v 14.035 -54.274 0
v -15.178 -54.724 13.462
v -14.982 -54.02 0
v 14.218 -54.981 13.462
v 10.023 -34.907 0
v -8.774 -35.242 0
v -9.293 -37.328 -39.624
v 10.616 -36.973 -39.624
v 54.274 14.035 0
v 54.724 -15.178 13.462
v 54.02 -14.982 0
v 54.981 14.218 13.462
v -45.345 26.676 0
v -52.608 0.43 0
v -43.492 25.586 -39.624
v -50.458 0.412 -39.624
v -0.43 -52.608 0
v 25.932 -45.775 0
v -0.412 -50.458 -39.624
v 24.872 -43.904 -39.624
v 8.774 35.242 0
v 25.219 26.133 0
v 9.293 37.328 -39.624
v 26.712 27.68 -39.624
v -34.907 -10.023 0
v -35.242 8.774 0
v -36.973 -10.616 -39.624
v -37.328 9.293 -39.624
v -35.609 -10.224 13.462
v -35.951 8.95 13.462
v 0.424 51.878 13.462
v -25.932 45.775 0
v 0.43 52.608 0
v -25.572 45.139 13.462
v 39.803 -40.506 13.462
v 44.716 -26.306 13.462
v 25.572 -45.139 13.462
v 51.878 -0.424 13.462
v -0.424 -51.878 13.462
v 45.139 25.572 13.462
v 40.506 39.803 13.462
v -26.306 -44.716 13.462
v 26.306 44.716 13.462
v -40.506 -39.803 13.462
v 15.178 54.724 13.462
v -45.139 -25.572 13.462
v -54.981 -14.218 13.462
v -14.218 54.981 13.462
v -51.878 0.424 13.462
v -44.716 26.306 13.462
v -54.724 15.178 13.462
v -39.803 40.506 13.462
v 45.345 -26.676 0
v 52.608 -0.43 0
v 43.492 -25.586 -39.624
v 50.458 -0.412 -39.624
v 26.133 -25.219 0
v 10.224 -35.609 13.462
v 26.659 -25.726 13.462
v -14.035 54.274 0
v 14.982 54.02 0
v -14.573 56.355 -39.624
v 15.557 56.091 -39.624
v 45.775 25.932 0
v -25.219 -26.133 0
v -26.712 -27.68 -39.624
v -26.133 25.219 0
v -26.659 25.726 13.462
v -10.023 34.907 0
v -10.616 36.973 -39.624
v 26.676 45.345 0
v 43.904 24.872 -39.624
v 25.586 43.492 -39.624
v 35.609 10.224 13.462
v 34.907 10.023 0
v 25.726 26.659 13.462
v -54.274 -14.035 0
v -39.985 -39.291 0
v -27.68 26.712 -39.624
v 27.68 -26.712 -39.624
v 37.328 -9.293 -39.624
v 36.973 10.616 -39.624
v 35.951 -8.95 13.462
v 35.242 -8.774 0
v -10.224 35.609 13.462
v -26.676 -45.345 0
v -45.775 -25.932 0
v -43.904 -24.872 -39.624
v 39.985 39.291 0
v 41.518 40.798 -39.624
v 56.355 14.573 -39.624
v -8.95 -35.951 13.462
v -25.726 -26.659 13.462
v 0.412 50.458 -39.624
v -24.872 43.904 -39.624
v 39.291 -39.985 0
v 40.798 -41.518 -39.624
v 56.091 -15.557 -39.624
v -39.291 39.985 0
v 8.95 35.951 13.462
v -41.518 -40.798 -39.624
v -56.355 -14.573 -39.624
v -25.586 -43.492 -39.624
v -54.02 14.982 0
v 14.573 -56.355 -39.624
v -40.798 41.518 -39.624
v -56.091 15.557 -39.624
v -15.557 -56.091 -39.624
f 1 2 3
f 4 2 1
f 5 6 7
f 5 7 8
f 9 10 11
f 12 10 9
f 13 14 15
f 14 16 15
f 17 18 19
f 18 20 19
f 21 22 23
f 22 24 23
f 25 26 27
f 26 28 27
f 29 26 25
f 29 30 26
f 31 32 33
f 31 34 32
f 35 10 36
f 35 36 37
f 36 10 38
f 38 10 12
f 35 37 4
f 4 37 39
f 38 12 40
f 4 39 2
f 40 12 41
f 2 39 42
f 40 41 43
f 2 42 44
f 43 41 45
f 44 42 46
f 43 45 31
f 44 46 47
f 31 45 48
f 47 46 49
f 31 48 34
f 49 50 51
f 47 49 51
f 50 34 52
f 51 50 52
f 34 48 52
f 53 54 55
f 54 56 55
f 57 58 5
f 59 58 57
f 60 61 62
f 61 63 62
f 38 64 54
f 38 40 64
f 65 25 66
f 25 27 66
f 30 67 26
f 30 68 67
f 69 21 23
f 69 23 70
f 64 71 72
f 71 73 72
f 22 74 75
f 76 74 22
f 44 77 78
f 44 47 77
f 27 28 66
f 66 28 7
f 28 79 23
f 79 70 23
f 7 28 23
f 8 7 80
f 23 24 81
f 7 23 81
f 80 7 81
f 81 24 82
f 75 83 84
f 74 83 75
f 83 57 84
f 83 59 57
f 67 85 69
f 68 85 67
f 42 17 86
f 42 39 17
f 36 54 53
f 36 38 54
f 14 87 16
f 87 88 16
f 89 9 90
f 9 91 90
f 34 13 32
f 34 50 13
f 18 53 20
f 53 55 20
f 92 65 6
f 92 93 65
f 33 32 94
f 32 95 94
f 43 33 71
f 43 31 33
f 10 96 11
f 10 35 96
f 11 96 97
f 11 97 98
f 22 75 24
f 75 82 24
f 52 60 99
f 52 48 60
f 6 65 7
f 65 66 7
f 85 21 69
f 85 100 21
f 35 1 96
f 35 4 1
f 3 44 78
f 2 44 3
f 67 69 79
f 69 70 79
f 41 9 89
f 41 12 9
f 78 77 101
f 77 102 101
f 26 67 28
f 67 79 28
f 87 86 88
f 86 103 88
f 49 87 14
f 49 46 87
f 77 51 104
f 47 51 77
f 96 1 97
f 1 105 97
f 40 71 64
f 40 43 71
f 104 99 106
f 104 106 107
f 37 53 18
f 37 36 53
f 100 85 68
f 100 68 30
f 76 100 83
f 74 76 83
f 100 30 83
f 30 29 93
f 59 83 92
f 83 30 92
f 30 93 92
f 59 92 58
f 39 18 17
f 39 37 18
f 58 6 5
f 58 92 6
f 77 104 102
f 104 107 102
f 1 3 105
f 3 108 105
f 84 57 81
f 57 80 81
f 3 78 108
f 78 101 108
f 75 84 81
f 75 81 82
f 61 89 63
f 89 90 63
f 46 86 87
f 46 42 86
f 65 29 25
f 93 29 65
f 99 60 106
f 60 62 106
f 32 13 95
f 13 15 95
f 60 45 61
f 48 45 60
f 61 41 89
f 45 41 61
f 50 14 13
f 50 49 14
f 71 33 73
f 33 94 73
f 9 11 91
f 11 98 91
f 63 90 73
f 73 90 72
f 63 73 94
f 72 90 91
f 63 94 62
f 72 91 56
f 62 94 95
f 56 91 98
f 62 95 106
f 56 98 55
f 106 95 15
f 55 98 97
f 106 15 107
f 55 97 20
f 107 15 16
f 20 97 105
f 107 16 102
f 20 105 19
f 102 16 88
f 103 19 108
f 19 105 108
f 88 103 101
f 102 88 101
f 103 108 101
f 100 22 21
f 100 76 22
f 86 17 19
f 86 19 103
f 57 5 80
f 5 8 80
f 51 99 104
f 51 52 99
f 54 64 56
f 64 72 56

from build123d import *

# Parameters (mm, degrees)
F1_DEPTH      = 13.462
F1_TAPER      = -3
F1_DEPTH_BACK = 39.624
F1_TAPER_BACK = -3


with BuildPart() as f1:
    # F0 (on Top) → F1 (new body, two sides)
    with BuildSketch(Plane.XY) as f1_sk:
        Polygon((54.2737135372, 14.03480515), (39.9850121059, 39.2913545657), (14.9823589715, 54.0198172559), (-14.03480515, 54.2737135372), (-39.2913545657, 39.9850121059), (-54.0198172559, 14.9823589715), (-54.2737135372, -14.03480515), (-39.9850121059, -39.2913545657), (-14.9823589715, -54.0198172559), (14.03480515, -54.2737135372), (39.2913545657, -39.9850121059), (54.0198172559, -14.9823589715), align=None)
        Polygon((26.6759825885, 45.3451159994), (45.7746365922, 25.9320310988), (52.6080136872, -0.4295205929), (45.3451159994, -26.6759825885), (25.9320310988, -45.7746365922), (-0.4295205929, -52.6080136872), (-26.6759825885, -45.3451159994), (-45.7746365922, -25.9320310988), (-52.6080136872, 0.4295205929), (-45.3451159994, 26.6759825885), (-25.9320310988, 45.7746365922), (0.4295205929, 52.6080136872), align=None, mode=Mode.SUBTRACT)
    extrude(amount=F1_DEPTH, taper=F1_TAPER)
    extrude(f1_sk.sketch, amount=-F1_DEPTH_BACK, taper=F1_TAPER_BACK)


with BuildPart() as f1b:
    # F0 (on Top) → F1, piece 2 (new body, two sides)
    with BuildSketch(Plane.XY) as f1_2_sk:
        Polygon((-26.1334300039, 25.2190905944), (-35.2417595686, 8.7736581131), (-34.9070881171, -10.0226689742), (-25.2190905944, -26.1334300039), (-8.7736581131, -35.2417595686), (10.0226689742, -34.9070881171), (26.1334300039, -25.2190905944), (35.2417595686, -8.7736581131), (34.9070881171, 10.0226689742), (25.2190905944, 26.1334300039), (8.7736581131, 35.2417595686), (-10.0226689742, 34.9070881171), align=None)
        Polygon((-33.5784053399, 0), (-16.7892026699, 29.0797520429), (16.7892026699, 29.0797520429), (33.5784053399, 0), (16.7892026699, -29.0797520429), (-16.7892026699, -29.0797520429), align=None, mode=Mode.SUBTRACT)
        Polygon((16.7892026699, 29.0797520429), (-16.7892026699, 29.0797520429), (-33.5784053399, 0), (-16.7892026699, -29.0797520429), (16.7892026699, -29.0797520429), (33.5784053399, 0), align=None)
        Polygon((-23.5324761021, -13.6692839848), (-23.6041852334, 13.545080126), (-0.0717091313, 27.2143641108), (23.5324761021, 13.6692839848), (23.6041852334, -13.545080126), (0.0717091313, -27.2143641108), align=None, mode=Mode.SUBTRACT)
        Polygon((-0.0717091313, 27.2143641108), (-23.6041852334, 13.545080126), (-23.5324761021, -13.6692839848), (0.0717091313, -27.2143641108), (23.6041852334, -13.545080126), (23.5324761021, 13.6692839848), align=None)
        Polygon((-10.1378994835, 19.2613495842), (11.6118683093, 18.4103532858), (21.7497677929, -0.8509962984), (10.1378994835, -19.2613495842), (-11.6118683093, -18.4103532858), (-21.7497677929, 0.8509962984), align=None, mode=Mode.SUBTRACT)
        Polygon((21.7497677929, -0.8509962984), (11.6118683093, 18.4103532858), (-10.1378994835, 19.2613495842), (-21.7497677929, 0.8509962984), (-11.6118683093, -18.4103532858), (10.1378994835, -19.2613495842), align=None)
    extrude(amount=F1_DEPTH, taper=F1_TAPER)
    extrude(f1_2_sk.sketch, amount=-F1_DEPTH_BACK, taper=F1_TAPER_BACK)


solid = Compound([f1.part, f1b.part])
